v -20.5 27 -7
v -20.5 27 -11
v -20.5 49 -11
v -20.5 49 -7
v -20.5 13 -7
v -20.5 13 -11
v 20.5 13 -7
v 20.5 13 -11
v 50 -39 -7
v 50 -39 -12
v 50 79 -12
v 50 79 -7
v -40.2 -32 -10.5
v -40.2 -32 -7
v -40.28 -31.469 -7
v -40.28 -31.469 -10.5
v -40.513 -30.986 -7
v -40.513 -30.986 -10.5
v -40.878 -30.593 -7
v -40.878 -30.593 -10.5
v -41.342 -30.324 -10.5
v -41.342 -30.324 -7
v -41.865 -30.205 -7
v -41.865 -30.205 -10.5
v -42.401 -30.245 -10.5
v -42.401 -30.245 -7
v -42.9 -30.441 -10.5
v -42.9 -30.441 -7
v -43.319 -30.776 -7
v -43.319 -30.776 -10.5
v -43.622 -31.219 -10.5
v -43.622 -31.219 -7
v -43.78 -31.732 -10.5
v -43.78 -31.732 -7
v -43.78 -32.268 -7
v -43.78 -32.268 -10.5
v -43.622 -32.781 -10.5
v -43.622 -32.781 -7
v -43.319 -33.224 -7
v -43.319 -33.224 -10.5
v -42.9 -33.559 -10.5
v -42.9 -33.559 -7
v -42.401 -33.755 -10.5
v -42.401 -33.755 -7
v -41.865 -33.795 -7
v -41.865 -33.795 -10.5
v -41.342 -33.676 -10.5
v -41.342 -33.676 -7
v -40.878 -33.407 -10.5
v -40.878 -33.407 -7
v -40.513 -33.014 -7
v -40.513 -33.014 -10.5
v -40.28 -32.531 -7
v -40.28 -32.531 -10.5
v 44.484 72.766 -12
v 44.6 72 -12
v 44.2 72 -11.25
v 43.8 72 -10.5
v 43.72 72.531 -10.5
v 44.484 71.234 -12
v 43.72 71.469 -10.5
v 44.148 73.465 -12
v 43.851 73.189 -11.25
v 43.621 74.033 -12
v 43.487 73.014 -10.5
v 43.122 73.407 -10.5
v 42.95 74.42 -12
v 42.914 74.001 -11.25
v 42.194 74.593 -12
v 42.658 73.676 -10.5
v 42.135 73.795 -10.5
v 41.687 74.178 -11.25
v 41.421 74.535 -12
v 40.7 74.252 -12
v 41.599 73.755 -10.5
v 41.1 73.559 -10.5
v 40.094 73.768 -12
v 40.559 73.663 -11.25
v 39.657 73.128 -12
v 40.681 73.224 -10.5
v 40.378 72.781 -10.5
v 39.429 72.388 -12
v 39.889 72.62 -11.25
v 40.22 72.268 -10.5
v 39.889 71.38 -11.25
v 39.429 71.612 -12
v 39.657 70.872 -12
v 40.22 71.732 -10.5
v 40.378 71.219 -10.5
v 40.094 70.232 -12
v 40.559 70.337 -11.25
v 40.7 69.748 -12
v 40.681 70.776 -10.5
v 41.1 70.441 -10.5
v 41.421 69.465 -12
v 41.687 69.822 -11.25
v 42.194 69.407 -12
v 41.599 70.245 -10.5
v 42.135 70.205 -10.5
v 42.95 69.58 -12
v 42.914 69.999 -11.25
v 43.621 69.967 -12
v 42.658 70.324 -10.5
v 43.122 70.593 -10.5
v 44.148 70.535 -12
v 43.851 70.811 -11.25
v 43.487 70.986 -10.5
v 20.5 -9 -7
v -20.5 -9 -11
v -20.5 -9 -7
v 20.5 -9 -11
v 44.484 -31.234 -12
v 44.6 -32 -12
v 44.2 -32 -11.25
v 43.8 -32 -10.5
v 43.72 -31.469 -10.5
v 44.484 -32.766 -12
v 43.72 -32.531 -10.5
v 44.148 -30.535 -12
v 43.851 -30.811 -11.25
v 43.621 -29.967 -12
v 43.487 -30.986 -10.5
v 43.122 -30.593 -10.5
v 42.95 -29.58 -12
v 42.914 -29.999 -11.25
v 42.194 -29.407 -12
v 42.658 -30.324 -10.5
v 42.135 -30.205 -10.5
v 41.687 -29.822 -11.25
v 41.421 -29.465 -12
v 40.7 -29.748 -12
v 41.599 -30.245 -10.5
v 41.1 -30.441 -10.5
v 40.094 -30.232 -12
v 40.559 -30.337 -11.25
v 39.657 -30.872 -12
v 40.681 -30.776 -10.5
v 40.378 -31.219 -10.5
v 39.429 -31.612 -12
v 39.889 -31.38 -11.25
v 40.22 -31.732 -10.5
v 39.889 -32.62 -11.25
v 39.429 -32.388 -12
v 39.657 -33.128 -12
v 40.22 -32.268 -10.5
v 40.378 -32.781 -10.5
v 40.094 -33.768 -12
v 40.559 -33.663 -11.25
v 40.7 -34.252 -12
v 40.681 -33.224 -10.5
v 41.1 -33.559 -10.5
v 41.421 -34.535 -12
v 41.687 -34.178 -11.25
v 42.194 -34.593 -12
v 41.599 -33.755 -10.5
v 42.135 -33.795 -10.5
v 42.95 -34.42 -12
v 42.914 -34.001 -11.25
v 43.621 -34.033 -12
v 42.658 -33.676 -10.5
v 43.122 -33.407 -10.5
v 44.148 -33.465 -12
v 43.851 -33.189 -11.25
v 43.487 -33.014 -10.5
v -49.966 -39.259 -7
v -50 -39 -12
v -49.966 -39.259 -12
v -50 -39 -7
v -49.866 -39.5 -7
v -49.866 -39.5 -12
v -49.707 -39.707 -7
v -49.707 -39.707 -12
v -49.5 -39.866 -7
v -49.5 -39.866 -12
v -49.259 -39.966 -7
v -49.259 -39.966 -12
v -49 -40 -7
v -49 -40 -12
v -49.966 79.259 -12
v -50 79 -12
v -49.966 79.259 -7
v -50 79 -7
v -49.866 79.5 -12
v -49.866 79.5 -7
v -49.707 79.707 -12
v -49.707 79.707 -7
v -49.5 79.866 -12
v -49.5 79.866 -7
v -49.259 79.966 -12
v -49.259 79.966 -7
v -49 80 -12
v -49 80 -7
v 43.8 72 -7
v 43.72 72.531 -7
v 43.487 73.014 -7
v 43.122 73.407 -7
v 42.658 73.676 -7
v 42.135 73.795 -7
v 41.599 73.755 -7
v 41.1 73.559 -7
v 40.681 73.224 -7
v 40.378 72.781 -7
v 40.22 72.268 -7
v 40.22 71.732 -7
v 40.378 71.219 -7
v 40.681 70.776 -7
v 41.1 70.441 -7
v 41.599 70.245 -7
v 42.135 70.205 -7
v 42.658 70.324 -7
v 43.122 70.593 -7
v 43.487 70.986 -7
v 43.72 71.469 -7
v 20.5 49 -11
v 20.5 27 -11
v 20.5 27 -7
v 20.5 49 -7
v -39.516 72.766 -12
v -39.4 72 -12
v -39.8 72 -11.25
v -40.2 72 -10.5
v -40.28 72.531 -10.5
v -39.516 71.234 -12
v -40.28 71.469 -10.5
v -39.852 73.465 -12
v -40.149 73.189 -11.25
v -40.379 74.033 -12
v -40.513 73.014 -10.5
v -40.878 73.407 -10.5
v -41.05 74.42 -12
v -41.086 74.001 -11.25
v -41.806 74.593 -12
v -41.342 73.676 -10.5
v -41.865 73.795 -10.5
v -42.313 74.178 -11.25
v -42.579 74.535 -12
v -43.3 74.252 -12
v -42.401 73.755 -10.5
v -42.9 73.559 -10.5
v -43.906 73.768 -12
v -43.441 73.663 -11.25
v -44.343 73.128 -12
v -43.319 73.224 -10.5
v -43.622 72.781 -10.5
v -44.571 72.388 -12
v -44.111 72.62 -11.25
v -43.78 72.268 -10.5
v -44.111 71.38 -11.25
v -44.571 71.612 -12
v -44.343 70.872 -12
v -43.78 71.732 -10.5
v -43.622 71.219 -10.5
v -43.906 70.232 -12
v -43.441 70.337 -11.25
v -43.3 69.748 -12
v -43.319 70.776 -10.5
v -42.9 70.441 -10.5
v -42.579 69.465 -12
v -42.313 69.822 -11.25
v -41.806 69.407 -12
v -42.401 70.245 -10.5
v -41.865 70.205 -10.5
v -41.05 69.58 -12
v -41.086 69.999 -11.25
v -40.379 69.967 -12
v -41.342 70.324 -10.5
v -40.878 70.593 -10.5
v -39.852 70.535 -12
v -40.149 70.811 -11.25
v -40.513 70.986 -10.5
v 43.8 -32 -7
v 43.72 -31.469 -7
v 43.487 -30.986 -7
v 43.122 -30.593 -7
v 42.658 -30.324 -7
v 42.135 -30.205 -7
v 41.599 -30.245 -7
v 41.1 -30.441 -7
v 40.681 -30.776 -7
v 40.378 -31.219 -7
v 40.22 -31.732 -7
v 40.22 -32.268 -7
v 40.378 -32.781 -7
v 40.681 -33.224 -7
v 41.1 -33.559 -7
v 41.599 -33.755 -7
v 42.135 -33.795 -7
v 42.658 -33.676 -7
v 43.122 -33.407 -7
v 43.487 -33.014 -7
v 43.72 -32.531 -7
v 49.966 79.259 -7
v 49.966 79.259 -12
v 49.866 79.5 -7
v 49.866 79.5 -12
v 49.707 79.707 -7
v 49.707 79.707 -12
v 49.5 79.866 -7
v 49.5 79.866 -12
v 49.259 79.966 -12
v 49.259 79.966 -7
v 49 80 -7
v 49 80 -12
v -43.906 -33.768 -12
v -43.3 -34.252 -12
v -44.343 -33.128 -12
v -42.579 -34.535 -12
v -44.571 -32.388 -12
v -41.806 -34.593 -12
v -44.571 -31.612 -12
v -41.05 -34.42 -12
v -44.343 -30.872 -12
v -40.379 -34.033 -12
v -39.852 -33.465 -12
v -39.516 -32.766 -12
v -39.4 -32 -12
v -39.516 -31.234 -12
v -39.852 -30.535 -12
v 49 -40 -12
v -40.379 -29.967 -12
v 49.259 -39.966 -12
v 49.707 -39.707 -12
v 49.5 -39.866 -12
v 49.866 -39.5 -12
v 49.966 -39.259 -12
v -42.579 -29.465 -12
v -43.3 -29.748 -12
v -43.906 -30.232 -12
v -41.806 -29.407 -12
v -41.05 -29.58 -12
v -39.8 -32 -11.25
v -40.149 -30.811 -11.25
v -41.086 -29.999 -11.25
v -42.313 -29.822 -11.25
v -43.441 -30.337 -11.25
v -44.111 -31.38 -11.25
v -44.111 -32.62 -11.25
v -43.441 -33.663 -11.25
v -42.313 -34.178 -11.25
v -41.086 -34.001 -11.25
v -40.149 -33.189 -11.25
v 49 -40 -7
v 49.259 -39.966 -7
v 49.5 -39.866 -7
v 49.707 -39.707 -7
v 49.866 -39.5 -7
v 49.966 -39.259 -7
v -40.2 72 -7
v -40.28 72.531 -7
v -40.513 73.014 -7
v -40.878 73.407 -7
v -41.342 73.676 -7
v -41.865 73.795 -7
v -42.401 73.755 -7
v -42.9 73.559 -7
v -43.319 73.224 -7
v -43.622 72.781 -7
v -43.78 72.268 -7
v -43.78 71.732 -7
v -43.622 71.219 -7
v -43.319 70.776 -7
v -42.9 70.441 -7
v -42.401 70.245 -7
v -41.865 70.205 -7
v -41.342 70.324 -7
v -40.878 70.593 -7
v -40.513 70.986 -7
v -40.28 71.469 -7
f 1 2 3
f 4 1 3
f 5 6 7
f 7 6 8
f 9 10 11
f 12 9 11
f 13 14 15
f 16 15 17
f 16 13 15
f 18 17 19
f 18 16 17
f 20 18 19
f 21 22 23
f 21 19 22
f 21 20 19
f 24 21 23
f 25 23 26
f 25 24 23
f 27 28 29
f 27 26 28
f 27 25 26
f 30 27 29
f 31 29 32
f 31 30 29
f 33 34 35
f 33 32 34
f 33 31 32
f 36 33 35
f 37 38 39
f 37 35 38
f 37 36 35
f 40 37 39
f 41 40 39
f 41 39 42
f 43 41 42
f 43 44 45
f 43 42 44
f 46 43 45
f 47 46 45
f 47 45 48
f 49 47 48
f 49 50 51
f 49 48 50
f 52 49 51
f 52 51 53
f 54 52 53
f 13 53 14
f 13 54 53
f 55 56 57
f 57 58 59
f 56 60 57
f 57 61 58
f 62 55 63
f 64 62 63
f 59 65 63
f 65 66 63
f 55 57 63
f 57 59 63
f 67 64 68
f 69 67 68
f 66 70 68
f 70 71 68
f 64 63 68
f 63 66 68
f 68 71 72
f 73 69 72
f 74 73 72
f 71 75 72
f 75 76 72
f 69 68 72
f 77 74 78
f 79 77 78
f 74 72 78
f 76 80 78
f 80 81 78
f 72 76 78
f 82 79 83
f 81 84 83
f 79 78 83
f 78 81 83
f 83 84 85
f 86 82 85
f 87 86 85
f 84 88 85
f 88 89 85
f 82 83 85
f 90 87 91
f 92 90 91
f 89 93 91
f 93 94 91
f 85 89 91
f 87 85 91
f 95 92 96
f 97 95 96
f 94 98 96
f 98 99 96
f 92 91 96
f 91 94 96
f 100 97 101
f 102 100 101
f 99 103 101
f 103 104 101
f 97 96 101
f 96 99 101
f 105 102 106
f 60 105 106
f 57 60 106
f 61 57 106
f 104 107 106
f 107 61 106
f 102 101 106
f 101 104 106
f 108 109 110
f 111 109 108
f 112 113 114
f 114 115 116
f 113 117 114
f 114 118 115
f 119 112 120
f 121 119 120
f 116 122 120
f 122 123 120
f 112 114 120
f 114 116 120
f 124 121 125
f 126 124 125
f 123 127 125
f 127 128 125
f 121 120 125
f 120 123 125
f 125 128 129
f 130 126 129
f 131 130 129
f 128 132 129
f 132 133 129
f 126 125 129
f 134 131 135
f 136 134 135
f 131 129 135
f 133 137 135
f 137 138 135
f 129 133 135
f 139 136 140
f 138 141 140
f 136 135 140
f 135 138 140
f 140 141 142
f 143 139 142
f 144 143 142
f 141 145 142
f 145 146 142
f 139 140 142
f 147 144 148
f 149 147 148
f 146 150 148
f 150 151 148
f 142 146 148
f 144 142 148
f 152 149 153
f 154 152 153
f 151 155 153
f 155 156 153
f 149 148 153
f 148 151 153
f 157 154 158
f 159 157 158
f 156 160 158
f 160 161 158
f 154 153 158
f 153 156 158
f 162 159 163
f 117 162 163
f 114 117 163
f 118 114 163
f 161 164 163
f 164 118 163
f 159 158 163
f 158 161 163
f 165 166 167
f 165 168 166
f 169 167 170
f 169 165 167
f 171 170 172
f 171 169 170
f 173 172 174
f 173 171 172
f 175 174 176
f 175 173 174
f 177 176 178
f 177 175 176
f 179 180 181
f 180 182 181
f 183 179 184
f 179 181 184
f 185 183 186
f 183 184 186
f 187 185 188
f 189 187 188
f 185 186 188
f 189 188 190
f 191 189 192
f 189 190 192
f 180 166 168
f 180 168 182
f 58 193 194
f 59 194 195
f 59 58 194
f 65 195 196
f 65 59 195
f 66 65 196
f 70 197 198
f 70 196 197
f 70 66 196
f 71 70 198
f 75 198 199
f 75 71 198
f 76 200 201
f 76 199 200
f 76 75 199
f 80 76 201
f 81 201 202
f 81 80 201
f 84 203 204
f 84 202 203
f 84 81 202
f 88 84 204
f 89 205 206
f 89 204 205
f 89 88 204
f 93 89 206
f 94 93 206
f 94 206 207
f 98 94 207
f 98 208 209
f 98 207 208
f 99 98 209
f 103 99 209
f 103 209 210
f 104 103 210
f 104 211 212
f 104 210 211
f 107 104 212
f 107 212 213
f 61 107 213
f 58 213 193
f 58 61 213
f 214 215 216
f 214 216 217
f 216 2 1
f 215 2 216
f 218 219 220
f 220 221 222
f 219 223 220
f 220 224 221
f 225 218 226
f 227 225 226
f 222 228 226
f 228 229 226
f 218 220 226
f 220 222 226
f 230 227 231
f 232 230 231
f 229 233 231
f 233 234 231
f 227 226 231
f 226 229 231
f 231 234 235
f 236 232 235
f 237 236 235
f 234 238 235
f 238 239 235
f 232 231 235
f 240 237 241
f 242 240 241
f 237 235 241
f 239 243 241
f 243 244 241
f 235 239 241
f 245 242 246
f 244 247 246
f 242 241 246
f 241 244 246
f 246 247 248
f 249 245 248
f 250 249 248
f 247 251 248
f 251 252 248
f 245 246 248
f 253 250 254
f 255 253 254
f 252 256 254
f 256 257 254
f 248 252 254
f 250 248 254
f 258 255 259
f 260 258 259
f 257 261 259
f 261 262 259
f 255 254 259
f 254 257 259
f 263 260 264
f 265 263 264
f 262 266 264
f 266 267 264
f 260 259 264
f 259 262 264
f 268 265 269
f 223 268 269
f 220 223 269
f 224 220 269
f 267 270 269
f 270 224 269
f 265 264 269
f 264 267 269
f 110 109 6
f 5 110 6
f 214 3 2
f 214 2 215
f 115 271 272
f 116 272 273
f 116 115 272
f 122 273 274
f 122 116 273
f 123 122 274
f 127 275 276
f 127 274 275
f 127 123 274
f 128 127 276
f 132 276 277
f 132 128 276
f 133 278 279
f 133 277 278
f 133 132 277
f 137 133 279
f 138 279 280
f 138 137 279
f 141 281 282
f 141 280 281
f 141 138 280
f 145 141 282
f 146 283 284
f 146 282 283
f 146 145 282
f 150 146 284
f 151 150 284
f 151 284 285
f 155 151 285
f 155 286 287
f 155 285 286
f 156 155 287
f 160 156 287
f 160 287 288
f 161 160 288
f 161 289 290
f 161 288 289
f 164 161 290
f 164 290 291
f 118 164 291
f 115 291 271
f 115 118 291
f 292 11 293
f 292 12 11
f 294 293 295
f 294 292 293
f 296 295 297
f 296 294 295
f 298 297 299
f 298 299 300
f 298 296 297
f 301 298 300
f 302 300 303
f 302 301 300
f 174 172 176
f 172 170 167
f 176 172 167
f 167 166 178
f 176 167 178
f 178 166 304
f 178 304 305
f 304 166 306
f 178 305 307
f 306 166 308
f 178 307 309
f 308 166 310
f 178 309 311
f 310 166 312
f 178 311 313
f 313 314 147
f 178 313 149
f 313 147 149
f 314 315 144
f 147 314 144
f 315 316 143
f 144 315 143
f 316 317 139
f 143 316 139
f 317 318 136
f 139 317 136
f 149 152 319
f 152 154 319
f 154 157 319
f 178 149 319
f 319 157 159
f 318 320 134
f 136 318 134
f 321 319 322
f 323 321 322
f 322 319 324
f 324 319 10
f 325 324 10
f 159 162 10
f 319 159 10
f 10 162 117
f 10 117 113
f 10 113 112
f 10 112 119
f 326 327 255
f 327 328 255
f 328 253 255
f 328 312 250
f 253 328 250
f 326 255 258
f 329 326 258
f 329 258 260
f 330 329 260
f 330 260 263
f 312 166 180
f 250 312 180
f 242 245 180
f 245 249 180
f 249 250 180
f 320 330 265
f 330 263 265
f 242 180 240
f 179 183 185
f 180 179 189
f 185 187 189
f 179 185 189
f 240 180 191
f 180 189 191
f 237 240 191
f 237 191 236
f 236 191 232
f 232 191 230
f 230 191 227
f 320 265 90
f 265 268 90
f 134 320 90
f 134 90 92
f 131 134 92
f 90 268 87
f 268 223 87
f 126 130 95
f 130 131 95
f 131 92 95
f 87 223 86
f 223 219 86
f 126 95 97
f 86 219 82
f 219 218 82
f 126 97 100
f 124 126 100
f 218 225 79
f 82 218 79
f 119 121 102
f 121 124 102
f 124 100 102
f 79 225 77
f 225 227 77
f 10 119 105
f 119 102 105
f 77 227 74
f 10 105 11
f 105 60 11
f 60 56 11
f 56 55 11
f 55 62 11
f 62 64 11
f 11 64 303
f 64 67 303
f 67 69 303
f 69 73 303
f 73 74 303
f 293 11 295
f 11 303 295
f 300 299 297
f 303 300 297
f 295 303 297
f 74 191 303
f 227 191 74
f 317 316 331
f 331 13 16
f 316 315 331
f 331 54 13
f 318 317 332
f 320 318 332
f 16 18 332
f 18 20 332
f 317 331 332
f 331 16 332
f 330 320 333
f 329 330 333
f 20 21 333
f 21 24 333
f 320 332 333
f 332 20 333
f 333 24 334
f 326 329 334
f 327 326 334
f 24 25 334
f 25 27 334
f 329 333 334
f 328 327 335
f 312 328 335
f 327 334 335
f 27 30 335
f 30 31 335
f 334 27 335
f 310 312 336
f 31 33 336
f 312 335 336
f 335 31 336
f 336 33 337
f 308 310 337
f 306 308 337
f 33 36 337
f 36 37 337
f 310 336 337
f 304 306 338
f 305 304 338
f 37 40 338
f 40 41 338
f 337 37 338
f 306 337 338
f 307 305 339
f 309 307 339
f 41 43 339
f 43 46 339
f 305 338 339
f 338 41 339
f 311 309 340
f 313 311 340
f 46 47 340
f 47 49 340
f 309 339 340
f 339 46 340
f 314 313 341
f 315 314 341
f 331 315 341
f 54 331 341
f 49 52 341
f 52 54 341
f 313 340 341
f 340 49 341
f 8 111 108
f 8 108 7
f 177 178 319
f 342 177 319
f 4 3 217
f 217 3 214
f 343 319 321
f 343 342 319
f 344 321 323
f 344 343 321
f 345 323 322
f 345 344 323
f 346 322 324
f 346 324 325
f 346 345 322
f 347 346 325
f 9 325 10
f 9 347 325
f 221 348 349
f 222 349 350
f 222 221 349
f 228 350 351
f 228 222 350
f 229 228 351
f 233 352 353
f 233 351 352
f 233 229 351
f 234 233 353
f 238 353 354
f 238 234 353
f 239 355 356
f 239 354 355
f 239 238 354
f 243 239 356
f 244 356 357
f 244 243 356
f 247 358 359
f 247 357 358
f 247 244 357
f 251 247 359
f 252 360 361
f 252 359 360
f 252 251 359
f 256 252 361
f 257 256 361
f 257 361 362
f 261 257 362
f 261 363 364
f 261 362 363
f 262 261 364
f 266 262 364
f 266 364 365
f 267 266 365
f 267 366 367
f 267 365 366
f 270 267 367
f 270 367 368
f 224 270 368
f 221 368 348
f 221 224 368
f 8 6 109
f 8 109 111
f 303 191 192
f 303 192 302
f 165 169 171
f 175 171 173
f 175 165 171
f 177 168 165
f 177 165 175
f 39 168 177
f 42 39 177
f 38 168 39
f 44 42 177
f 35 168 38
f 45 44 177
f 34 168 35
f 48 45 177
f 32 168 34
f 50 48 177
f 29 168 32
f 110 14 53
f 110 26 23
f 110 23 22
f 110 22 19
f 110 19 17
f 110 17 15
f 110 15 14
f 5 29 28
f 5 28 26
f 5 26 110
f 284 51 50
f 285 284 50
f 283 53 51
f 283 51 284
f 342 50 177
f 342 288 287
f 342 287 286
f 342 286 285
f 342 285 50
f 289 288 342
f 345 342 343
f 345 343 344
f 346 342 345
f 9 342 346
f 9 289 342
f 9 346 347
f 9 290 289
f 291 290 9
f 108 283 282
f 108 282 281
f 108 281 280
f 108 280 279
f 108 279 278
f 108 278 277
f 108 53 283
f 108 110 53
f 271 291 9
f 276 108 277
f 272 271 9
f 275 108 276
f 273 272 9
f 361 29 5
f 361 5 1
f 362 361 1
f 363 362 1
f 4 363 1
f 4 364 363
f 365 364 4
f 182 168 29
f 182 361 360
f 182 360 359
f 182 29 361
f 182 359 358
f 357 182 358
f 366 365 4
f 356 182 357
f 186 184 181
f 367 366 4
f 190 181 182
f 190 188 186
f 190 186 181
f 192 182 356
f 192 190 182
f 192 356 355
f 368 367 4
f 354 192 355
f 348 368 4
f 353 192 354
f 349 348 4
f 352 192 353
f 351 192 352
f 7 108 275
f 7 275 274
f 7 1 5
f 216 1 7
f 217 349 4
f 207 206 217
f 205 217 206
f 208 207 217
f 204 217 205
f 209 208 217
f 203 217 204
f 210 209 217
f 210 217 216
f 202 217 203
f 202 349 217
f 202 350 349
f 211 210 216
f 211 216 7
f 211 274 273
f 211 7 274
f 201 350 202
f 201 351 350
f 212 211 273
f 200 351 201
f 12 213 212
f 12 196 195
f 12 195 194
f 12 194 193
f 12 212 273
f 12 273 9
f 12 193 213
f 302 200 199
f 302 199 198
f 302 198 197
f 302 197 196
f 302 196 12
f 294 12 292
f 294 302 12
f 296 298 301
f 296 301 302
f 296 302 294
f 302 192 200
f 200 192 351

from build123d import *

# Parameters (mm, degrees)
BOX041_W          = 41
BOX041_H          = 22
BOX041_DEPTH      = 10
CYLINDER018_R     = 1.8
CYLINDER018_DEPTH = 6.6
ARRAY016_X_COUNT  = 2
ARRAY016_X_PITCH  = 84
ARRAY016_Y_COUNT  = 2
ARRAY016_Y_PITCH  = 104
BOX042_W          = 41
BOX042_H          = 22
BOX042_DEPTH      = 10
BOX040_W          = 100
BOX040_H          = 120
BOX040_DEPTH      = 5
FILLET008_R       = 1


with BuildPart() as magnit_place002:
    # Box041 → Box041 (new body)
    with BuildSketch(Plane(origin=(-20.5, -9, -11), x_dir=(1, 0, 0), z_dir=(0, 0, 1))):
        with Locations((20.5, 11)):
            Rectangle(BOX041_W, BOX041_H)
    extrude(amount=BOX041_DEPTH)


with BuildPart() as cone:
    # Cone → Cone (revolve)
    with BuildSketch(Plane.XZ):
        Polygon((0, 0), (2.6, 0), (1.8, 1.5), (0, 1.5), align=None)
    revolve(axis=Axis((0, 0, 0), (0, 0, 1)))


with BuildPart() as magnet_stand_cube_hole_array_clone:
    # Cylinder018 → Cylinder018 (new body)
    with BuildSketch(Plane.XY):
        Circle(CYLINDER018_R)
    extrude(amount=CYLINDER018_DEPTH)

    # Fusion005004012: union Cone
    add(cone.part)

    # Array016 X: magnet stand cube hole array clone ×2


with BuildPart() as magnet_stand_cube_hole_array_clone_1:
    add(magnet_stand_cube_hole_array_clone.part)
    with Locations(*[(i * ARRAY016_X_PITCH, 0, 0) for i in range(1, ARRAY016_X_COUNT)]):
        add(magnet_stand_cube_hole_array_clone.part)

    # Array016 Y: magnet stand cube hole array clone ×2


with BuildPart() as magnet_stand_cube_hole_array_clone_2:
    add(magnet_stand_cube_hole_array_clone_1.part)
    with Locations(*[(0, i * ARRAY016_Y_PITCH, 0) for i in range(1, ARRAY016_Y_COUNT)]):
        add(magnet_stand_cube_hole_array_clone_1.part)


with BuildPart() as magnet_stand_cube_hole_array_clone_3:
    # Array016 placement: moved
    add(magnet_stand_cube_hole_array_clone_2.part.moved(Location((-42, -32, -12))))


with BuildPart() as magnit_extract_fusion001:
    # Box042 → Box042 (new body)
    with BuildSketch(Plane(origin=(-20.5, 27, -11), x_dir=(1, 0, 0), z_dir=(0, 0, 1))):
        with Locations((20.5, 11)):
            Rectangle(BOX042_W, BOX042_H)
    extrude(amount=BOX042_DEPTH)

    # Fusion005004011: union magnit place002, magnet stand cube hole array clone
    add(magnit_place002.part)
    add(magnet_stand_cube_hole_array_clone_3.part)


with BuildPart() as magnit_alternative_wall_cut:
    # Box040 → Box040 (new body)
    with BuildSketch(Plane(origin=(-50, -40, -12), x_dir=(1, 0, 0), z_dir=(0, 0, 1))):
        with Locations((50, 60)):
            Rectangle(BOX040_W, BOX040_H)
    extrude(amount=BOX040_DEPTH)

    # Fillet008
    fillet008_edges = [magnit_alternative_wall_cut.edges().sort_by_distance(p)[0] for p in [
        (-50, -40, -9.5),
        (-50, 80, -9.5),
        (50, -40, -9.5),
        (50, 80, -9.5),
    ]]
    fillet(fillet008_edges, radius=FILLET008_R)

    # Cut002003010: cut magnit extract fusion001
    add(magnit_extract_fusion001.part, mode=Mode.SUBTRACT)


solid = magnit_alternative_wall_cut.part
